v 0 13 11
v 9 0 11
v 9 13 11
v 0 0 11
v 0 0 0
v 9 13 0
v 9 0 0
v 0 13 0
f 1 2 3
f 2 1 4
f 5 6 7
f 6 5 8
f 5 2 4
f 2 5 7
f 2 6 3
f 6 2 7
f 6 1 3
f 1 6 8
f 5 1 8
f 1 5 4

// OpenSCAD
// Generated by SolidPython 1.0.1 on 2020-07-29 00:46:55


cube(size = [9, 13, 11]);
/***********************************************
*********      SolidPython code:      **********
************************************************
 
# import packages: SolidPython
from solid import *
from solid.utils import *
from itertools import chain, combinations, permutations


class Resize:

    def __init__(self, scad_file):
        self.scad_file = scad_file
        #self.scad_file = import_scad(scad_file)
        # cone/cylinder param:
        self.r1 = 0
        self.r2 = 0
        self.h = 0
        # rectangular prism param:
        self.w = 0
        self.l = 0
        # ellipse param:
        self.r = 0

    # import OpenScad code (file name corresponds to shape)


    # classify shape + parameters
    def assign(self, param1, param2, param3):
        if self.scad_file == 'cone.scad':
            self.r1 = param1
            self.r2 = param2
            self.h = param3
        elif self.scad_file == 'cylinder.scad':
            self.r1 = param1
            self.r2 = param2
            self.h = param3
        elif self.scad_file == 'rectangularPrism.scad':
            self.h = param1
            self.l = param2
            self.w = param3
        else:
            self.r = param1
            self.h = param2

    # resize parameters
    def iterate(self):
        x = range(3, 20, 2)
        i = 1
        if self.scad_file == 'cone.scad':
            tempList = list(permutations(x, 2))
            for temp in tempList:
                param1 = temp[0]
                param2 = temp[1]
                filepath = 'produced_scad_files/' + 'cone' + str(param1) + '_' + str(param2) + '_' + '.scad'
                scad_render_to_file(cylinder(h=param1, r1=param2, r2=0), filepath)

        elif self.scad_file == 'cylinder.scad':
            tempList = list(permutations(x, 3))
            for temp in tempList:
                param1 = temp[0]
                param2 = temp[1]
                filepath = 'produced_scad_files/' + 'cylinder' + str(param1) + '_' + str(param2) + '_' + '.scad'
                scad_render_to_file(cylinder(h=param1, r1=param2, r2=param2), filepath)

        elif self.scad_file == 'rectangularPrism.scad':
            tempList = list(permutations(x, 3))
            for temp in tempList:
                param1 = temp[0]
                param2 = temp[1]
                param3 = temp[2]
                filepath = 'produced_scad_files/' + 'rectangularPrism' + str(param1) + '_' + str(param2) + '_' + str(
                    param3) + '.scad'
                scad_render_to_file(cube(size=(param1, param2, param3)), filepath)

        elif self.scad_file == 'ellipse.scad':
            tempList = list(permutations(x, 4))
            for temp in tempList:
                param1 = temp[0]
                param2 = temp[1]
                param3 = temp[2]
                param4 = temp[3]
                filepath = 'produced_scad_files/' + 'ellipse' + str(param1) + '_' + str(param2) + '_' + str(param3) + '_' + str(param4) + '.scad'
                scad_render_to_file(scale([param1, param2, param3])(sphere(r=param4)), filepath)

    def render_to_scadfile(self):
        scad_render_to_file(scad, 'example.scad') 
 
************************************************/
